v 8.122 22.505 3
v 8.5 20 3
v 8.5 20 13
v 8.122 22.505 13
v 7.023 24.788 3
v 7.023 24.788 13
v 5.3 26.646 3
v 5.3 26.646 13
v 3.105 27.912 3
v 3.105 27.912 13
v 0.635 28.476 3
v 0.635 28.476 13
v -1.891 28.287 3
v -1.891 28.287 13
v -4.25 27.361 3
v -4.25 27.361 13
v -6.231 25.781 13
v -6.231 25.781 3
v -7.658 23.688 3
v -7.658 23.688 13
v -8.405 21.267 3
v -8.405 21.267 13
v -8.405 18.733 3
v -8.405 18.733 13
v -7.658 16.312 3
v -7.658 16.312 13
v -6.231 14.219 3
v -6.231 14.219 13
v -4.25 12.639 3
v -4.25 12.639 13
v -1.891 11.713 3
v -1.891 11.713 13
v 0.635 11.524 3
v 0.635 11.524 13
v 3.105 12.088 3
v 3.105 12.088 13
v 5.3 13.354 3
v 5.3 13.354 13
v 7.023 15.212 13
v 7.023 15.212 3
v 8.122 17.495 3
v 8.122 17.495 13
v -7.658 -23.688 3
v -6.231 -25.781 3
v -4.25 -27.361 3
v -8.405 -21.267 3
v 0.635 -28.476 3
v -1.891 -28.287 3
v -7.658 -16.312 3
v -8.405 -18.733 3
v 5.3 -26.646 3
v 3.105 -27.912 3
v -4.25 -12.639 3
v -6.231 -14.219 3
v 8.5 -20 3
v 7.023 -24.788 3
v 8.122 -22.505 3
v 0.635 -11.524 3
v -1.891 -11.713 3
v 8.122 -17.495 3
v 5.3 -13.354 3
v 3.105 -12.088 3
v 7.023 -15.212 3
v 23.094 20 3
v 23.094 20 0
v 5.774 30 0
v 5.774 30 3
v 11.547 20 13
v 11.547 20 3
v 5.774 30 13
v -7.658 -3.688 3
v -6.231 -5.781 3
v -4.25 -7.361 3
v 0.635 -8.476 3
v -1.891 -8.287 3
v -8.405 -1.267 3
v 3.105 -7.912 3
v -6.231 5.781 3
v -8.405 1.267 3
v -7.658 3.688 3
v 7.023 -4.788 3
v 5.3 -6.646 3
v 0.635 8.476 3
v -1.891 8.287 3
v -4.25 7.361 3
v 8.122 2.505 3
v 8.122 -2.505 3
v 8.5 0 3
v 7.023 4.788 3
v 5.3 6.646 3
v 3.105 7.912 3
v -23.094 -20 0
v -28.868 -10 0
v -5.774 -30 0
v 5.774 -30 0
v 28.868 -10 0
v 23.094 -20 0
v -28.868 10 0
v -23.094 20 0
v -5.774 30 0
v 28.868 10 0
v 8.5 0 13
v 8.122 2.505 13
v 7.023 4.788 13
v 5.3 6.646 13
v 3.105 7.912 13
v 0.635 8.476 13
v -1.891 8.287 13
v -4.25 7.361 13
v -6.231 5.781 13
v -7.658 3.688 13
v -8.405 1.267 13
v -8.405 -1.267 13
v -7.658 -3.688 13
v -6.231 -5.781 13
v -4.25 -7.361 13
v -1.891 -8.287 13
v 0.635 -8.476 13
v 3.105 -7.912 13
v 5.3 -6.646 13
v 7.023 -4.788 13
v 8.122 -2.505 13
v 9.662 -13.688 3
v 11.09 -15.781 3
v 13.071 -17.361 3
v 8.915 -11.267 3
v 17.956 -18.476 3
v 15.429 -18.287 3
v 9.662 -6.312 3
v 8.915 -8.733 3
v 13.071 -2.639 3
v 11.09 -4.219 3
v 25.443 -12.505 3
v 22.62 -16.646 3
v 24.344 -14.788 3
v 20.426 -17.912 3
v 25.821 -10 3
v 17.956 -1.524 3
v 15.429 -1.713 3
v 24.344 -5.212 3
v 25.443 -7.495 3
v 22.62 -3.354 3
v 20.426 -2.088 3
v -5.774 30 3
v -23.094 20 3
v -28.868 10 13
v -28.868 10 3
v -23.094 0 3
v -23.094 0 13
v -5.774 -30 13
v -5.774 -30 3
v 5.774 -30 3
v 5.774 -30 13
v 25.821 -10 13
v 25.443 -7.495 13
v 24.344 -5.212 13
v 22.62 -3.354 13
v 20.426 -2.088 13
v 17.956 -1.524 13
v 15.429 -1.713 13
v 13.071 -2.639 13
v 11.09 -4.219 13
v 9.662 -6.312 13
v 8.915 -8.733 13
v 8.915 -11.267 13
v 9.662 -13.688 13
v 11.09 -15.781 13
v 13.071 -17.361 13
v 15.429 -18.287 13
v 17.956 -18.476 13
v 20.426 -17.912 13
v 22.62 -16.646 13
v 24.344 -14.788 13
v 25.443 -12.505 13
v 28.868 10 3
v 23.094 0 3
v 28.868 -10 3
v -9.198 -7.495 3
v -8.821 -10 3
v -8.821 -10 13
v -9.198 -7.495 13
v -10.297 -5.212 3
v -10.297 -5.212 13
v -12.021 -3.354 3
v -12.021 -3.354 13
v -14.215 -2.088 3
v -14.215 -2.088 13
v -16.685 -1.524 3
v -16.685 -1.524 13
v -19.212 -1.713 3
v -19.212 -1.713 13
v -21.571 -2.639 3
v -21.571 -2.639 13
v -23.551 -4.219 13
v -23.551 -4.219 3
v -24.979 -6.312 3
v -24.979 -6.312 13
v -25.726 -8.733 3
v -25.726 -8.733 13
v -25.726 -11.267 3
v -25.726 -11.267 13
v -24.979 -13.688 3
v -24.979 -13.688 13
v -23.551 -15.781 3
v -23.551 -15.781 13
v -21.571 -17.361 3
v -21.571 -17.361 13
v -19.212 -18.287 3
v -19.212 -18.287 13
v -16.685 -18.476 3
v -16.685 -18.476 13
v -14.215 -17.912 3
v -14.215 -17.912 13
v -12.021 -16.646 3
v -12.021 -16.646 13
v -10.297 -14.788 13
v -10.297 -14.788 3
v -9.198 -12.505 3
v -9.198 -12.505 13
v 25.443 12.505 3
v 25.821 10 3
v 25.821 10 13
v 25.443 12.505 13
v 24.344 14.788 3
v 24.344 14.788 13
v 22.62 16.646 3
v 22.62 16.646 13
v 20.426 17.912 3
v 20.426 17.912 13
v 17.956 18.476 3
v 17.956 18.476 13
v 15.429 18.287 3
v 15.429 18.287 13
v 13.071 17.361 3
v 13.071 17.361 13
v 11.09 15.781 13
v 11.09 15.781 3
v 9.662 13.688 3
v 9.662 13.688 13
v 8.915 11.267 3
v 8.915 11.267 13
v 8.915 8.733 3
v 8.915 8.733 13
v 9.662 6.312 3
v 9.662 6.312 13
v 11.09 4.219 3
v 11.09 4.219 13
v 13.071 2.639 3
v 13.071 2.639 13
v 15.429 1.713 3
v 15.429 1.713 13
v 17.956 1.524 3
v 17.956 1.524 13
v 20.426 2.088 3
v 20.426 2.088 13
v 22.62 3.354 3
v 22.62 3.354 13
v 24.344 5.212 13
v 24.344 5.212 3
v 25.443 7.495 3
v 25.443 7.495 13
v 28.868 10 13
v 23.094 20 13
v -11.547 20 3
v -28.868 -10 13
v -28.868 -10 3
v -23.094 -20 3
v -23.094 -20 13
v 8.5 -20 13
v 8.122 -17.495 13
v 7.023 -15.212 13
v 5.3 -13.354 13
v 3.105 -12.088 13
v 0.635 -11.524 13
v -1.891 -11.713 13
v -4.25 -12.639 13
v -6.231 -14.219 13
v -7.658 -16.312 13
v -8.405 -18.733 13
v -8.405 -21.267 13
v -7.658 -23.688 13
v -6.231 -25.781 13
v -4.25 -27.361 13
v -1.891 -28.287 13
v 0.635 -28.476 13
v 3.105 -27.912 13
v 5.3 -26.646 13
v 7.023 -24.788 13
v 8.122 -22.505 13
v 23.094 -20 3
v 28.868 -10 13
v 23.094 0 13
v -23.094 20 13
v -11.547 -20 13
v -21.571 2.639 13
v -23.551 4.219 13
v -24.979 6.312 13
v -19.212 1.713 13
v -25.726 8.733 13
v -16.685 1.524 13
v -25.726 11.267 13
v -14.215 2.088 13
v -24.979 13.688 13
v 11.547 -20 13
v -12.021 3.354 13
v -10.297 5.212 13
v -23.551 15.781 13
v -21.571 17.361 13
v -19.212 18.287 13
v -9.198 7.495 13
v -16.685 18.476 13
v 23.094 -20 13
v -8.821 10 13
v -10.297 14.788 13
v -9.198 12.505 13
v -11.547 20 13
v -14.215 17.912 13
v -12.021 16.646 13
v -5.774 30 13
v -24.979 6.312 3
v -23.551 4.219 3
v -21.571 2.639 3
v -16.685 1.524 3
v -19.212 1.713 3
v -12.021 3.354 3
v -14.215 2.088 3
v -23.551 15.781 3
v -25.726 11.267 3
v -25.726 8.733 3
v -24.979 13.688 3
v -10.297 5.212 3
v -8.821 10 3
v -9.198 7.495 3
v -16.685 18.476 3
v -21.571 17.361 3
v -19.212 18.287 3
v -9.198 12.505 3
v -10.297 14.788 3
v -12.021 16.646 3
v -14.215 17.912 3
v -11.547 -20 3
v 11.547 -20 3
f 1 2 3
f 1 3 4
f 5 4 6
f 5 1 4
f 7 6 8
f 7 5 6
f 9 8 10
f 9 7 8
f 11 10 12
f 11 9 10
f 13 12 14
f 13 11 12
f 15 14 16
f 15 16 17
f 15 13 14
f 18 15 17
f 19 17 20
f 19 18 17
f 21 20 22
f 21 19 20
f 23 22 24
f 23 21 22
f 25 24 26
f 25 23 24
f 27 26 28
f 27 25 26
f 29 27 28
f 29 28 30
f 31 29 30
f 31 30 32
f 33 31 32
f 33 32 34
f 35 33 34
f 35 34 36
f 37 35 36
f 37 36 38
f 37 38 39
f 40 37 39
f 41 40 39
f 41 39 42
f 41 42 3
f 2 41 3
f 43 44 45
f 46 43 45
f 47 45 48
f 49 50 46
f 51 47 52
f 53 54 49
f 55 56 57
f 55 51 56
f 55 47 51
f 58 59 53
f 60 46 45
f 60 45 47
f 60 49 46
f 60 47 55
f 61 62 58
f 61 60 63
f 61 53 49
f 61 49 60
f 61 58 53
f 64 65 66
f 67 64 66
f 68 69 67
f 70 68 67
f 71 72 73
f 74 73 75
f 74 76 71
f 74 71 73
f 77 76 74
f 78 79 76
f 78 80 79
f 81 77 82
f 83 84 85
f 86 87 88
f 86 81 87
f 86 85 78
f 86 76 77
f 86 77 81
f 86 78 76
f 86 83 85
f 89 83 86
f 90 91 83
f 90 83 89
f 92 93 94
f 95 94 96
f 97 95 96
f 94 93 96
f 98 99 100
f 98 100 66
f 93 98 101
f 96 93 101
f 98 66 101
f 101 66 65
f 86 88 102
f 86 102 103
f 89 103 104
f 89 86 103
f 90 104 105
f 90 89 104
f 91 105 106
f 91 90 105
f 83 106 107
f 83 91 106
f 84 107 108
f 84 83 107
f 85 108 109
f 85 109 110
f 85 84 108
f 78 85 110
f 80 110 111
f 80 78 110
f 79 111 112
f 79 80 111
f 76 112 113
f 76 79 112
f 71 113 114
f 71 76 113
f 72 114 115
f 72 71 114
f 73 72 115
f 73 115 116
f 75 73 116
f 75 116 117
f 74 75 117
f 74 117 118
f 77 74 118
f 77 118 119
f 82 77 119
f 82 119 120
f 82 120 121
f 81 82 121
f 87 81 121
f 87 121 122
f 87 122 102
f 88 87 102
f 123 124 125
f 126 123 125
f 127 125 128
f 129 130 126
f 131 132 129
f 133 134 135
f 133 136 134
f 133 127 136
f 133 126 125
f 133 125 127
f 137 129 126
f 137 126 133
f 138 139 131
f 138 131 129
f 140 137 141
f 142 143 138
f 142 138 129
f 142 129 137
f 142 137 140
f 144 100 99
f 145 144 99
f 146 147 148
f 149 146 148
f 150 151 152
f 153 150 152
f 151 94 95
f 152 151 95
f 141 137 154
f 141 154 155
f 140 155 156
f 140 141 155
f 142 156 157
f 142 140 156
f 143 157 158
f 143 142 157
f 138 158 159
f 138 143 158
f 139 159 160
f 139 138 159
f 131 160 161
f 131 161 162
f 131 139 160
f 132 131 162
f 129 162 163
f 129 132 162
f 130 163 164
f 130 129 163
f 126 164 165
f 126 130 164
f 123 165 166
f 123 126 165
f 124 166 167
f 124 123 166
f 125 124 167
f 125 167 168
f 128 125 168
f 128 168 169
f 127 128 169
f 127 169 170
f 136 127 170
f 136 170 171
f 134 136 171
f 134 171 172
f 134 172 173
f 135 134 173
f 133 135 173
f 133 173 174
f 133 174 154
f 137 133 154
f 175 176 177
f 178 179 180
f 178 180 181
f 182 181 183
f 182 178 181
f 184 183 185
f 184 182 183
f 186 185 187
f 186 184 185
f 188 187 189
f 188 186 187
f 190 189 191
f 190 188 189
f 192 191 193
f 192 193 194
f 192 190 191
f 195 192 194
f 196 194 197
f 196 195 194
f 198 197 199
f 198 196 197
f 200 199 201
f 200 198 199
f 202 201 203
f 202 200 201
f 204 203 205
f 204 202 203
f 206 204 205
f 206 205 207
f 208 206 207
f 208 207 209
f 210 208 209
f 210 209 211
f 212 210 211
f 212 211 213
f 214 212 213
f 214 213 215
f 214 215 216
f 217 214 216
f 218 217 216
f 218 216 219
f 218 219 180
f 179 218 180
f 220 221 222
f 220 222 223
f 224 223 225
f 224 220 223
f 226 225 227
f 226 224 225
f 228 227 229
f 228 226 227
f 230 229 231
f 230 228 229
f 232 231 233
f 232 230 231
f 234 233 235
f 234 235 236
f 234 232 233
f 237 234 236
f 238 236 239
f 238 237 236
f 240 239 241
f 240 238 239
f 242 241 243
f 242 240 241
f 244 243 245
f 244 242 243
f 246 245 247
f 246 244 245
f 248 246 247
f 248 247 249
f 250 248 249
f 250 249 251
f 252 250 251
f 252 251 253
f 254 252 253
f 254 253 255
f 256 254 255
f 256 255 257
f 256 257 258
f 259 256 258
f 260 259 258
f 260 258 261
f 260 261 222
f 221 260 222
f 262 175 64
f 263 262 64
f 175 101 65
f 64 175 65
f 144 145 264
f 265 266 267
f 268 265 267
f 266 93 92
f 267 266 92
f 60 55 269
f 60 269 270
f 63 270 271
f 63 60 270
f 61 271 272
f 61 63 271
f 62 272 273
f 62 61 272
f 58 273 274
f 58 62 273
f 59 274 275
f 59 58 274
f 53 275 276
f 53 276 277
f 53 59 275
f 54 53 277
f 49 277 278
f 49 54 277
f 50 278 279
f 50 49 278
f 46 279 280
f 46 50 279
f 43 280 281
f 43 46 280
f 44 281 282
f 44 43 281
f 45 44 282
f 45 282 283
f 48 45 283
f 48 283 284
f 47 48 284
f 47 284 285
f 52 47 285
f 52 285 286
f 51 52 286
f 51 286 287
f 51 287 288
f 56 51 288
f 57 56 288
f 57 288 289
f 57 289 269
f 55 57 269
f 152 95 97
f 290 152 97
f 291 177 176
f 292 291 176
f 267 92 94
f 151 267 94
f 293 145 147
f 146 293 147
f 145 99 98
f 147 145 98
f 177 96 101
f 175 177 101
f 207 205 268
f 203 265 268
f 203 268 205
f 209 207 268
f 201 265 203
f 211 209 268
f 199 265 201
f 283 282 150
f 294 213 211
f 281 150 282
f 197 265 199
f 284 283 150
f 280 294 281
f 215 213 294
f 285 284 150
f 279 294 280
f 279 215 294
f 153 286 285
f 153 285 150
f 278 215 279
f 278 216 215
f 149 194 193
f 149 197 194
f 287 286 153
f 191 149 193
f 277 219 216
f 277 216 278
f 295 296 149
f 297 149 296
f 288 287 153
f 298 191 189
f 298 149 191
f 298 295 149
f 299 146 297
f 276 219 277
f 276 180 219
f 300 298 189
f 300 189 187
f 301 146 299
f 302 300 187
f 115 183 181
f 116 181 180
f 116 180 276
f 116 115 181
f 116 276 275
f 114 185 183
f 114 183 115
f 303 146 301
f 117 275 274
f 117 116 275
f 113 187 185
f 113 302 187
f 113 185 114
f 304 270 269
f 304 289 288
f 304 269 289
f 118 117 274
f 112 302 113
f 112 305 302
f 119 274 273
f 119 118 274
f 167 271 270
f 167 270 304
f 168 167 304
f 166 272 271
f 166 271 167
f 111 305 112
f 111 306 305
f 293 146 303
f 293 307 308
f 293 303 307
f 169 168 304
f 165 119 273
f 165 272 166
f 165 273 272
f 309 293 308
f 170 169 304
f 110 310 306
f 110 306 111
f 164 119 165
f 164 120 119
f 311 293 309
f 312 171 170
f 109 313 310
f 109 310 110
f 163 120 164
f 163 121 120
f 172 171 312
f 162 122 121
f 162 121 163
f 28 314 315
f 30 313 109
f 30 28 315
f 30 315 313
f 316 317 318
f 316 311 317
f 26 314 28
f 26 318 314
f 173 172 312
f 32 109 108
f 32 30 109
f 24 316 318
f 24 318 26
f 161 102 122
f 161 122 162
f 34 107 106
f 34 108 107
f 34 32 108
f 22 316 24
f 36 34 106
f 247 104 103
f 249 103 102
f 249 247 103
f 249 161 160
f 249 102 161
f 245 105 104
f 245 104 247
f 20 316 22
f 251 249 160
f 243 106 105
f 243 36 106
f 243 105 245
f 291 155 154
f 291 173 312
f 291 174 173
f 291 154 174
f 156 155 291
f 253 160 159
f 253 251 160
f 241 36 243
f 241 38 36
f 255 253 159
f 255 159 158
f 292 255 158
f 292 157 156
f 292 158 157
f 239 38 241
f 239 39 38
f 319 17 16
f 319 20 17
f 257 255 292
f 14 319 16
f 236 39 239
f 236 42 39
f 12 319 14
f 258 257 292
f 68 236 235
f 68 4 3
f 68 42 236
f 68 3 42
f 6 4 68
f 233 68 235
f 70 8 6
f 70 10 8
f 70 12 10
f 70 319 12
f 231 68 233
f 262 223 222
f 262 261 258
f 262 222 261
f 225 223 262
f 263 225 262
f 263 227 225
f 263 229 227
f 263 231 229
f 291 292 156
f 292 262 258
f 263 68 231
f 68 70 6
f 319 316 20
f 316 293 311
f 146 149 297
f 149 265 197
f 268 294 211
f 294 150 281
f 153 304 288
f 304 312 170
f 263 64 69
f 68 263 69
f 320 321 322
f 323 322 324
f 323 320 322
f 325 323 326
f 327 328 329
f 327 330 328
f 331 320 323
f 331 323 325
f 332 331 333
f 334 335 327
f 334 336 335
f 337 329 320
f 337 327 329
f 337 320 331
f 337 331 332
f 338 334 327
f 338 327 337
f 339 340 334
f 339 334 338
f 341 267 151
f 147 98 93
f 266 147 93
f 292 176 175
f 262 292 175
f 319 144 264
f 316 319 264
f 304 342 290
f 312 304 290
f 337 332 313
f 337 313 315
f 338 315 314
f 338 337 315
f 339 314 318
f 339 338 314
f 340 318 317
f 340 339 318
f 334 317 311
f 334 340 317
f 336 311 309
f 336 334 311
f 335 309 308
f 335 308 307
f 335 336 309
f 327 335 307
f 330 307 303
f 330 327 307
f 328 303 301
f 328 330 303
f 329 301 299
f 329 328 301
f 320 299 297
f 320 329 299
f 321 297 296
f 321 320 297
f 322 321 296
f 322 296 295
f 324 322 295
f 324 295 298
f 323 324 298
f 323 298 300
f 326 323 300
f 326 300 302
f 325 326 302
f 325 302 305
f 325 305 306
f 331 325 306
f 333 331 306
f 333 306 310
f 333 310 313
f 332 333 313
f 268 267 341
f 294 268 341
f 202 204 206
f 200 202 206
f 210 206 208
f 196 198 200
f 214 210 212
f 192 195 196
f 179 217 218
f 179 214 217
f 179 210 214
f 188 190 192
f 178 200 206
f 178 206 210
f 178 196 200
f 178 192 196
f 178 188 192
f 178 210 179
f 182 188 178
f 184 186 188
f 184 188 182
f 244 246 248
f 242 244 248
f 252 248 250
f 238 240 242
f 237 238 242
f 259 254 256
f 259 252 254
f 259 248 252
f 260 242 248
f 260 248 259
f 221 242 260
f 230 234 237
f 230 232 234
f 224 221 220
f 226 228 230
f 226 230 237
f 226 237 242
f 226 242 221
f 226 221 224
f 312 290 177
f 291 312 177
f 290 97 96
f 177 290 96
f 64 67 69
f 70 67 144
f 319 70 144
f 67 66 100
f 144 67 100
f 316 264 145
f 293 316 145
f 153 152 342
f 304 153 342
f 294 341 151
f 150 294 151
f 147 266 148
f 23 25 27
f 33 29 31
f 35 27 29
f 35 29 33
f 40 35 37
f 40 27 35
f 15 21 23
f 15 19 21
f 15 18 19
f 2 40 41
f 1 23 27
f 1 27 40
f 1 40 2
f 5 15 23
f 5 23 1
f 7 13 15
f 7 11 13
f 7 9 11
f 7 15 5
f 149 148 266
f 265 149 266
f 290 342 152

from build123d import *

# Parameters (mm, degrees)
F0_R     = 8.5
F1_DEPTH = 3
F2_DEPTH = 13


with BuildPart() as f1:
    # F0 (on Top) → F1 (new body)
    with BuildSketch(Plane.XY):
        Polygon((-23.094011, 20), (-11.547005, 20), (-5.773503, 30), align=None)
        Polygon((5.773503, 30), (11.547005, 20), (23.094011, 20), align=None)
        Polygon((11.547005, 20), (5.773503, 10), (11.547005, 0), (23.094011, 0), (28.867513, 10), (23.094011, 20), align=None)
        with Locations((17.320508, 10)):
            Circle(F0_R, mode=Mode.SUBTRACT)
        Polygon((-5.773503, -30), (-11.547005, -20), (-23.094011, -20), align=None)
        Polygon((23.094011, 0), (11.547005, 0), (5.773503, -10), (11.547005, -20), (23.094011, -20), (28.867513, -10), align=None)
        with Locations((17.320508, -10)):
            Circle(F0_R, mode=Mode.SUBTRACT)
        Polygon((28.867513, 10), (23.094011, 0), (28.867513, -10), align=None)
        Polygon((-28.867513, -10), (-23.094011, 0), (-28.867513, 10), align=None)
        Polygon((-11.547005, 20), (-5.773503, 10), (5.773503, 10), (11.547005, 20), (5.773503, 30), (-5.773503, 30), align=None)
        with Locations((0, 20)):
            Circle(F0_R, mode=Mode.SUBTRACT)
        Polygon((5.773503, 10), (-5.773503, 10), (-11.547005, 0), (-5.773503, -10), (5.773503, -10), (11.547005, 0), align=None)
        Circle(F0_R, mode=Mode.SUBTRACT)
        Polygon((5.773503, -10), (-5.773503, -10), (-11.547005, -20), (-5.773503, -30), (5.773503, -30), (11.547005, -20), align=None)
        with Locations((0, -20)):
            Circle(F0_R, mode=Mode.SUBTRACT)
        Polygon((23.094011, -20), (11.547005, -20), (5.773503, -30), align=None)
        Polygon((-5.773503, -10), (-11.547005, 0), (-23.094011, 0), (-28.867513, -10), (-23.094011, -20), (-11.547005, -20), align=None)
        with Locations((-17.320508, -10)):
            Circle(F0_R, mode=Mode.SUBTRACT)
        Polygon((-11.547005, 0), (-5.773503, 10), (-11.547005, 20), (-23.094011, 20), (-28.867513, 10), (-23.094011, 0), align=None)
        with Locations((-17.320508, 10)):
            Circle(F0_R, mode=Mode.SUBTRACT)
        with Locations((0, 20)):
            Circle(F0_R)
        with Locations((17.320508, 10)):
            Circle(F0_R)
        Circle(F0_R)
        with Locations((17.320508, -10)):
            Circle(F0_R)
        with Locations((0, -20)):
            Circle(F0_R)
        with Locations((-17.320508, -10)):
            Circle(F0_R)
        with Locations((-17.320508, 10)):
            Circle(F0_R)
    extrude(amount=F1_DEPTH)

    # F0 (on Top) → F2 (join)
    with BuildSketch(Plane.XY):
        Polygon((5.773503, 10), (-5.773503, 10), (-11.547005, 0), (-5.773503, -10), (5.773503, -10), (11.547005, 0), align=None)
        Circle(F0_R, mode=Mode.SUBTRACT)
        Polygon((-5.773503, -10), (-11.547005, 0), (-23.094011, 0), (-28.867513, -10), (-23.094011, -20), (-11.547005, -20), align=None)
        with Locations((-17.320508, -10)):
            Circle(F0_R, mode=Mode.SUBTRACT)
        Polygon((-11.547005, 20), (-5.773503, 10), (5.773503, 10), (11.547005, 20), (5.773503, 30), (-5.773503, 30), align=None)
        with Locations((0, 20)):
            Circle(F0_R, mode=Mode.SUBTRACT)
        Polygon((5.773503, -10), (-5.773503, -10), (-11.547005, -20), (-5.773503, -30), (5.773503, -30), (11.547005, -20), align=None)
        with Locations((0, -20)):
            Circle(F0_R, mode=Mode.SUBTRACT)
        Polygon((23.094011, 0), (11.547005, 0), (5.773503, -10), (11.547005, -20), (23.094011, -20), (28.867513, -10), align=None)
        with Locations((17.320508, -10)):
            Circle(F0_R, mode=Mode.SUBTRACT)
        Polygon((11.547005, 20), (5.773503, 10), (11.547005, 0), (23.094011, 0), (28.867513, 10), (23.094011, 20), align=None)
        with Locations((17.320508, 10)):
            Circle(F0_R, mode=Mode.SUBTRACT)
        Polygon((-11.547005, 0), (-5.773503, 10), (-11.547005, 20), (-23.094011, 20), (-28.867513, 10), (-23.094011, 0), align=None)
        with Locations((-17.320508, 10)):
            Circle(F0_R, mode=Mode.SUBTRACT)
    extrude(amount=F2_DEPTH)


solid = f1.part
